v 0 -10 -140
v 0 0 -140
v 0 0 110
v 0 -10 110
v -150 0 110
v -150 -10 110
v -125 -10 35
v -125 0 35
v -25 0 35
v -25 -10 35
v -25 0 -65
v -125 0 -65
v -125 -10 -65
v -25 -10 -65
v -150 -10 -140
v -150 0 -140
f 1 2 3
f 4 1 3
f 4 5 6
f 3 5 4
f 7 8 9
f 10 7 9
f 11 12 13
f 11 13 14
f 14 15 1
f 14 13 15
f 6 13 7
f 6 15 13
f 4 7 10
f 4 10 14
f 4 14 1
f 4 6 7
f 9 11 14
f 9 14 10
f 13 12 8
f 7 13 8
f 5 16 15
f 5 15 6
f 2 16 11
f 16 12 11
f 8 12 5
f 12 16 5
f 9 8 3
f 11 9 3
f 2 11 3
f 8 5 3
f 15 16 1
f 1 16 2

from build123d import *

# Parameters (mm, degrees)
SKETCH1_W           = 150
SKETCH1_H           = 30
BOSS_EXTRUDE1_DEPTH = 10
SKETCH9_W           = 150
SKETCH9_H           = 250
SKETCH9_W_2         = 100
SKETCH9_H_2         = 100
BOSS_EXTRUDE3_DEPTH = 10
SKETCH25_W          = 150
SKETCH25_H          = 30
CUT_EXTRUDE2_DEPTH  = 10


with BuildPart() as part:
    # Sketch1 → Boss-Extrude1 (new body)
    with BuildSketch(Plane(origin=(0, 0, 0), x_dir=(1, 0, 0), z_dir=(0, 1, 0))):
        with Locations((-75, 15)):
            Rectangle(SKETCH1_W, SKETCH1_H)
    extrude(amount=BOSS_EXTRUDE1_DEPTH)

    # Sketch9 → Boss-Extrude3 (add)
    with BuildSketch(Plane.XZ):
        with Locations((-75, -15)):
            Rectangle(SKETCH9_W, SKETCH9_H)
        with Locations((-75, -15)):
            Rectangle(SKETCH9_W_2, SKETCH9_H_2, mode=Mode.SUBTRACT)
    extrude(amount=BOSS_EXTRUDE3_DEPTH)

    # Sketch25 → Cut-Extrude2 (cut)
    with BuildSketch(Plane(origin=(0, 0, 0), x_dir=(1, 0, 0), z_dir=(0, 1, 0))):
        with Locations((-75, 15)):
            Rectangle(SKETCH25_W, SKETCH25_H)
    extrude(amount=CUT_EXTRUDE2_DEPTH, mode=Mode.SUBTRACT)


solid = part.part
